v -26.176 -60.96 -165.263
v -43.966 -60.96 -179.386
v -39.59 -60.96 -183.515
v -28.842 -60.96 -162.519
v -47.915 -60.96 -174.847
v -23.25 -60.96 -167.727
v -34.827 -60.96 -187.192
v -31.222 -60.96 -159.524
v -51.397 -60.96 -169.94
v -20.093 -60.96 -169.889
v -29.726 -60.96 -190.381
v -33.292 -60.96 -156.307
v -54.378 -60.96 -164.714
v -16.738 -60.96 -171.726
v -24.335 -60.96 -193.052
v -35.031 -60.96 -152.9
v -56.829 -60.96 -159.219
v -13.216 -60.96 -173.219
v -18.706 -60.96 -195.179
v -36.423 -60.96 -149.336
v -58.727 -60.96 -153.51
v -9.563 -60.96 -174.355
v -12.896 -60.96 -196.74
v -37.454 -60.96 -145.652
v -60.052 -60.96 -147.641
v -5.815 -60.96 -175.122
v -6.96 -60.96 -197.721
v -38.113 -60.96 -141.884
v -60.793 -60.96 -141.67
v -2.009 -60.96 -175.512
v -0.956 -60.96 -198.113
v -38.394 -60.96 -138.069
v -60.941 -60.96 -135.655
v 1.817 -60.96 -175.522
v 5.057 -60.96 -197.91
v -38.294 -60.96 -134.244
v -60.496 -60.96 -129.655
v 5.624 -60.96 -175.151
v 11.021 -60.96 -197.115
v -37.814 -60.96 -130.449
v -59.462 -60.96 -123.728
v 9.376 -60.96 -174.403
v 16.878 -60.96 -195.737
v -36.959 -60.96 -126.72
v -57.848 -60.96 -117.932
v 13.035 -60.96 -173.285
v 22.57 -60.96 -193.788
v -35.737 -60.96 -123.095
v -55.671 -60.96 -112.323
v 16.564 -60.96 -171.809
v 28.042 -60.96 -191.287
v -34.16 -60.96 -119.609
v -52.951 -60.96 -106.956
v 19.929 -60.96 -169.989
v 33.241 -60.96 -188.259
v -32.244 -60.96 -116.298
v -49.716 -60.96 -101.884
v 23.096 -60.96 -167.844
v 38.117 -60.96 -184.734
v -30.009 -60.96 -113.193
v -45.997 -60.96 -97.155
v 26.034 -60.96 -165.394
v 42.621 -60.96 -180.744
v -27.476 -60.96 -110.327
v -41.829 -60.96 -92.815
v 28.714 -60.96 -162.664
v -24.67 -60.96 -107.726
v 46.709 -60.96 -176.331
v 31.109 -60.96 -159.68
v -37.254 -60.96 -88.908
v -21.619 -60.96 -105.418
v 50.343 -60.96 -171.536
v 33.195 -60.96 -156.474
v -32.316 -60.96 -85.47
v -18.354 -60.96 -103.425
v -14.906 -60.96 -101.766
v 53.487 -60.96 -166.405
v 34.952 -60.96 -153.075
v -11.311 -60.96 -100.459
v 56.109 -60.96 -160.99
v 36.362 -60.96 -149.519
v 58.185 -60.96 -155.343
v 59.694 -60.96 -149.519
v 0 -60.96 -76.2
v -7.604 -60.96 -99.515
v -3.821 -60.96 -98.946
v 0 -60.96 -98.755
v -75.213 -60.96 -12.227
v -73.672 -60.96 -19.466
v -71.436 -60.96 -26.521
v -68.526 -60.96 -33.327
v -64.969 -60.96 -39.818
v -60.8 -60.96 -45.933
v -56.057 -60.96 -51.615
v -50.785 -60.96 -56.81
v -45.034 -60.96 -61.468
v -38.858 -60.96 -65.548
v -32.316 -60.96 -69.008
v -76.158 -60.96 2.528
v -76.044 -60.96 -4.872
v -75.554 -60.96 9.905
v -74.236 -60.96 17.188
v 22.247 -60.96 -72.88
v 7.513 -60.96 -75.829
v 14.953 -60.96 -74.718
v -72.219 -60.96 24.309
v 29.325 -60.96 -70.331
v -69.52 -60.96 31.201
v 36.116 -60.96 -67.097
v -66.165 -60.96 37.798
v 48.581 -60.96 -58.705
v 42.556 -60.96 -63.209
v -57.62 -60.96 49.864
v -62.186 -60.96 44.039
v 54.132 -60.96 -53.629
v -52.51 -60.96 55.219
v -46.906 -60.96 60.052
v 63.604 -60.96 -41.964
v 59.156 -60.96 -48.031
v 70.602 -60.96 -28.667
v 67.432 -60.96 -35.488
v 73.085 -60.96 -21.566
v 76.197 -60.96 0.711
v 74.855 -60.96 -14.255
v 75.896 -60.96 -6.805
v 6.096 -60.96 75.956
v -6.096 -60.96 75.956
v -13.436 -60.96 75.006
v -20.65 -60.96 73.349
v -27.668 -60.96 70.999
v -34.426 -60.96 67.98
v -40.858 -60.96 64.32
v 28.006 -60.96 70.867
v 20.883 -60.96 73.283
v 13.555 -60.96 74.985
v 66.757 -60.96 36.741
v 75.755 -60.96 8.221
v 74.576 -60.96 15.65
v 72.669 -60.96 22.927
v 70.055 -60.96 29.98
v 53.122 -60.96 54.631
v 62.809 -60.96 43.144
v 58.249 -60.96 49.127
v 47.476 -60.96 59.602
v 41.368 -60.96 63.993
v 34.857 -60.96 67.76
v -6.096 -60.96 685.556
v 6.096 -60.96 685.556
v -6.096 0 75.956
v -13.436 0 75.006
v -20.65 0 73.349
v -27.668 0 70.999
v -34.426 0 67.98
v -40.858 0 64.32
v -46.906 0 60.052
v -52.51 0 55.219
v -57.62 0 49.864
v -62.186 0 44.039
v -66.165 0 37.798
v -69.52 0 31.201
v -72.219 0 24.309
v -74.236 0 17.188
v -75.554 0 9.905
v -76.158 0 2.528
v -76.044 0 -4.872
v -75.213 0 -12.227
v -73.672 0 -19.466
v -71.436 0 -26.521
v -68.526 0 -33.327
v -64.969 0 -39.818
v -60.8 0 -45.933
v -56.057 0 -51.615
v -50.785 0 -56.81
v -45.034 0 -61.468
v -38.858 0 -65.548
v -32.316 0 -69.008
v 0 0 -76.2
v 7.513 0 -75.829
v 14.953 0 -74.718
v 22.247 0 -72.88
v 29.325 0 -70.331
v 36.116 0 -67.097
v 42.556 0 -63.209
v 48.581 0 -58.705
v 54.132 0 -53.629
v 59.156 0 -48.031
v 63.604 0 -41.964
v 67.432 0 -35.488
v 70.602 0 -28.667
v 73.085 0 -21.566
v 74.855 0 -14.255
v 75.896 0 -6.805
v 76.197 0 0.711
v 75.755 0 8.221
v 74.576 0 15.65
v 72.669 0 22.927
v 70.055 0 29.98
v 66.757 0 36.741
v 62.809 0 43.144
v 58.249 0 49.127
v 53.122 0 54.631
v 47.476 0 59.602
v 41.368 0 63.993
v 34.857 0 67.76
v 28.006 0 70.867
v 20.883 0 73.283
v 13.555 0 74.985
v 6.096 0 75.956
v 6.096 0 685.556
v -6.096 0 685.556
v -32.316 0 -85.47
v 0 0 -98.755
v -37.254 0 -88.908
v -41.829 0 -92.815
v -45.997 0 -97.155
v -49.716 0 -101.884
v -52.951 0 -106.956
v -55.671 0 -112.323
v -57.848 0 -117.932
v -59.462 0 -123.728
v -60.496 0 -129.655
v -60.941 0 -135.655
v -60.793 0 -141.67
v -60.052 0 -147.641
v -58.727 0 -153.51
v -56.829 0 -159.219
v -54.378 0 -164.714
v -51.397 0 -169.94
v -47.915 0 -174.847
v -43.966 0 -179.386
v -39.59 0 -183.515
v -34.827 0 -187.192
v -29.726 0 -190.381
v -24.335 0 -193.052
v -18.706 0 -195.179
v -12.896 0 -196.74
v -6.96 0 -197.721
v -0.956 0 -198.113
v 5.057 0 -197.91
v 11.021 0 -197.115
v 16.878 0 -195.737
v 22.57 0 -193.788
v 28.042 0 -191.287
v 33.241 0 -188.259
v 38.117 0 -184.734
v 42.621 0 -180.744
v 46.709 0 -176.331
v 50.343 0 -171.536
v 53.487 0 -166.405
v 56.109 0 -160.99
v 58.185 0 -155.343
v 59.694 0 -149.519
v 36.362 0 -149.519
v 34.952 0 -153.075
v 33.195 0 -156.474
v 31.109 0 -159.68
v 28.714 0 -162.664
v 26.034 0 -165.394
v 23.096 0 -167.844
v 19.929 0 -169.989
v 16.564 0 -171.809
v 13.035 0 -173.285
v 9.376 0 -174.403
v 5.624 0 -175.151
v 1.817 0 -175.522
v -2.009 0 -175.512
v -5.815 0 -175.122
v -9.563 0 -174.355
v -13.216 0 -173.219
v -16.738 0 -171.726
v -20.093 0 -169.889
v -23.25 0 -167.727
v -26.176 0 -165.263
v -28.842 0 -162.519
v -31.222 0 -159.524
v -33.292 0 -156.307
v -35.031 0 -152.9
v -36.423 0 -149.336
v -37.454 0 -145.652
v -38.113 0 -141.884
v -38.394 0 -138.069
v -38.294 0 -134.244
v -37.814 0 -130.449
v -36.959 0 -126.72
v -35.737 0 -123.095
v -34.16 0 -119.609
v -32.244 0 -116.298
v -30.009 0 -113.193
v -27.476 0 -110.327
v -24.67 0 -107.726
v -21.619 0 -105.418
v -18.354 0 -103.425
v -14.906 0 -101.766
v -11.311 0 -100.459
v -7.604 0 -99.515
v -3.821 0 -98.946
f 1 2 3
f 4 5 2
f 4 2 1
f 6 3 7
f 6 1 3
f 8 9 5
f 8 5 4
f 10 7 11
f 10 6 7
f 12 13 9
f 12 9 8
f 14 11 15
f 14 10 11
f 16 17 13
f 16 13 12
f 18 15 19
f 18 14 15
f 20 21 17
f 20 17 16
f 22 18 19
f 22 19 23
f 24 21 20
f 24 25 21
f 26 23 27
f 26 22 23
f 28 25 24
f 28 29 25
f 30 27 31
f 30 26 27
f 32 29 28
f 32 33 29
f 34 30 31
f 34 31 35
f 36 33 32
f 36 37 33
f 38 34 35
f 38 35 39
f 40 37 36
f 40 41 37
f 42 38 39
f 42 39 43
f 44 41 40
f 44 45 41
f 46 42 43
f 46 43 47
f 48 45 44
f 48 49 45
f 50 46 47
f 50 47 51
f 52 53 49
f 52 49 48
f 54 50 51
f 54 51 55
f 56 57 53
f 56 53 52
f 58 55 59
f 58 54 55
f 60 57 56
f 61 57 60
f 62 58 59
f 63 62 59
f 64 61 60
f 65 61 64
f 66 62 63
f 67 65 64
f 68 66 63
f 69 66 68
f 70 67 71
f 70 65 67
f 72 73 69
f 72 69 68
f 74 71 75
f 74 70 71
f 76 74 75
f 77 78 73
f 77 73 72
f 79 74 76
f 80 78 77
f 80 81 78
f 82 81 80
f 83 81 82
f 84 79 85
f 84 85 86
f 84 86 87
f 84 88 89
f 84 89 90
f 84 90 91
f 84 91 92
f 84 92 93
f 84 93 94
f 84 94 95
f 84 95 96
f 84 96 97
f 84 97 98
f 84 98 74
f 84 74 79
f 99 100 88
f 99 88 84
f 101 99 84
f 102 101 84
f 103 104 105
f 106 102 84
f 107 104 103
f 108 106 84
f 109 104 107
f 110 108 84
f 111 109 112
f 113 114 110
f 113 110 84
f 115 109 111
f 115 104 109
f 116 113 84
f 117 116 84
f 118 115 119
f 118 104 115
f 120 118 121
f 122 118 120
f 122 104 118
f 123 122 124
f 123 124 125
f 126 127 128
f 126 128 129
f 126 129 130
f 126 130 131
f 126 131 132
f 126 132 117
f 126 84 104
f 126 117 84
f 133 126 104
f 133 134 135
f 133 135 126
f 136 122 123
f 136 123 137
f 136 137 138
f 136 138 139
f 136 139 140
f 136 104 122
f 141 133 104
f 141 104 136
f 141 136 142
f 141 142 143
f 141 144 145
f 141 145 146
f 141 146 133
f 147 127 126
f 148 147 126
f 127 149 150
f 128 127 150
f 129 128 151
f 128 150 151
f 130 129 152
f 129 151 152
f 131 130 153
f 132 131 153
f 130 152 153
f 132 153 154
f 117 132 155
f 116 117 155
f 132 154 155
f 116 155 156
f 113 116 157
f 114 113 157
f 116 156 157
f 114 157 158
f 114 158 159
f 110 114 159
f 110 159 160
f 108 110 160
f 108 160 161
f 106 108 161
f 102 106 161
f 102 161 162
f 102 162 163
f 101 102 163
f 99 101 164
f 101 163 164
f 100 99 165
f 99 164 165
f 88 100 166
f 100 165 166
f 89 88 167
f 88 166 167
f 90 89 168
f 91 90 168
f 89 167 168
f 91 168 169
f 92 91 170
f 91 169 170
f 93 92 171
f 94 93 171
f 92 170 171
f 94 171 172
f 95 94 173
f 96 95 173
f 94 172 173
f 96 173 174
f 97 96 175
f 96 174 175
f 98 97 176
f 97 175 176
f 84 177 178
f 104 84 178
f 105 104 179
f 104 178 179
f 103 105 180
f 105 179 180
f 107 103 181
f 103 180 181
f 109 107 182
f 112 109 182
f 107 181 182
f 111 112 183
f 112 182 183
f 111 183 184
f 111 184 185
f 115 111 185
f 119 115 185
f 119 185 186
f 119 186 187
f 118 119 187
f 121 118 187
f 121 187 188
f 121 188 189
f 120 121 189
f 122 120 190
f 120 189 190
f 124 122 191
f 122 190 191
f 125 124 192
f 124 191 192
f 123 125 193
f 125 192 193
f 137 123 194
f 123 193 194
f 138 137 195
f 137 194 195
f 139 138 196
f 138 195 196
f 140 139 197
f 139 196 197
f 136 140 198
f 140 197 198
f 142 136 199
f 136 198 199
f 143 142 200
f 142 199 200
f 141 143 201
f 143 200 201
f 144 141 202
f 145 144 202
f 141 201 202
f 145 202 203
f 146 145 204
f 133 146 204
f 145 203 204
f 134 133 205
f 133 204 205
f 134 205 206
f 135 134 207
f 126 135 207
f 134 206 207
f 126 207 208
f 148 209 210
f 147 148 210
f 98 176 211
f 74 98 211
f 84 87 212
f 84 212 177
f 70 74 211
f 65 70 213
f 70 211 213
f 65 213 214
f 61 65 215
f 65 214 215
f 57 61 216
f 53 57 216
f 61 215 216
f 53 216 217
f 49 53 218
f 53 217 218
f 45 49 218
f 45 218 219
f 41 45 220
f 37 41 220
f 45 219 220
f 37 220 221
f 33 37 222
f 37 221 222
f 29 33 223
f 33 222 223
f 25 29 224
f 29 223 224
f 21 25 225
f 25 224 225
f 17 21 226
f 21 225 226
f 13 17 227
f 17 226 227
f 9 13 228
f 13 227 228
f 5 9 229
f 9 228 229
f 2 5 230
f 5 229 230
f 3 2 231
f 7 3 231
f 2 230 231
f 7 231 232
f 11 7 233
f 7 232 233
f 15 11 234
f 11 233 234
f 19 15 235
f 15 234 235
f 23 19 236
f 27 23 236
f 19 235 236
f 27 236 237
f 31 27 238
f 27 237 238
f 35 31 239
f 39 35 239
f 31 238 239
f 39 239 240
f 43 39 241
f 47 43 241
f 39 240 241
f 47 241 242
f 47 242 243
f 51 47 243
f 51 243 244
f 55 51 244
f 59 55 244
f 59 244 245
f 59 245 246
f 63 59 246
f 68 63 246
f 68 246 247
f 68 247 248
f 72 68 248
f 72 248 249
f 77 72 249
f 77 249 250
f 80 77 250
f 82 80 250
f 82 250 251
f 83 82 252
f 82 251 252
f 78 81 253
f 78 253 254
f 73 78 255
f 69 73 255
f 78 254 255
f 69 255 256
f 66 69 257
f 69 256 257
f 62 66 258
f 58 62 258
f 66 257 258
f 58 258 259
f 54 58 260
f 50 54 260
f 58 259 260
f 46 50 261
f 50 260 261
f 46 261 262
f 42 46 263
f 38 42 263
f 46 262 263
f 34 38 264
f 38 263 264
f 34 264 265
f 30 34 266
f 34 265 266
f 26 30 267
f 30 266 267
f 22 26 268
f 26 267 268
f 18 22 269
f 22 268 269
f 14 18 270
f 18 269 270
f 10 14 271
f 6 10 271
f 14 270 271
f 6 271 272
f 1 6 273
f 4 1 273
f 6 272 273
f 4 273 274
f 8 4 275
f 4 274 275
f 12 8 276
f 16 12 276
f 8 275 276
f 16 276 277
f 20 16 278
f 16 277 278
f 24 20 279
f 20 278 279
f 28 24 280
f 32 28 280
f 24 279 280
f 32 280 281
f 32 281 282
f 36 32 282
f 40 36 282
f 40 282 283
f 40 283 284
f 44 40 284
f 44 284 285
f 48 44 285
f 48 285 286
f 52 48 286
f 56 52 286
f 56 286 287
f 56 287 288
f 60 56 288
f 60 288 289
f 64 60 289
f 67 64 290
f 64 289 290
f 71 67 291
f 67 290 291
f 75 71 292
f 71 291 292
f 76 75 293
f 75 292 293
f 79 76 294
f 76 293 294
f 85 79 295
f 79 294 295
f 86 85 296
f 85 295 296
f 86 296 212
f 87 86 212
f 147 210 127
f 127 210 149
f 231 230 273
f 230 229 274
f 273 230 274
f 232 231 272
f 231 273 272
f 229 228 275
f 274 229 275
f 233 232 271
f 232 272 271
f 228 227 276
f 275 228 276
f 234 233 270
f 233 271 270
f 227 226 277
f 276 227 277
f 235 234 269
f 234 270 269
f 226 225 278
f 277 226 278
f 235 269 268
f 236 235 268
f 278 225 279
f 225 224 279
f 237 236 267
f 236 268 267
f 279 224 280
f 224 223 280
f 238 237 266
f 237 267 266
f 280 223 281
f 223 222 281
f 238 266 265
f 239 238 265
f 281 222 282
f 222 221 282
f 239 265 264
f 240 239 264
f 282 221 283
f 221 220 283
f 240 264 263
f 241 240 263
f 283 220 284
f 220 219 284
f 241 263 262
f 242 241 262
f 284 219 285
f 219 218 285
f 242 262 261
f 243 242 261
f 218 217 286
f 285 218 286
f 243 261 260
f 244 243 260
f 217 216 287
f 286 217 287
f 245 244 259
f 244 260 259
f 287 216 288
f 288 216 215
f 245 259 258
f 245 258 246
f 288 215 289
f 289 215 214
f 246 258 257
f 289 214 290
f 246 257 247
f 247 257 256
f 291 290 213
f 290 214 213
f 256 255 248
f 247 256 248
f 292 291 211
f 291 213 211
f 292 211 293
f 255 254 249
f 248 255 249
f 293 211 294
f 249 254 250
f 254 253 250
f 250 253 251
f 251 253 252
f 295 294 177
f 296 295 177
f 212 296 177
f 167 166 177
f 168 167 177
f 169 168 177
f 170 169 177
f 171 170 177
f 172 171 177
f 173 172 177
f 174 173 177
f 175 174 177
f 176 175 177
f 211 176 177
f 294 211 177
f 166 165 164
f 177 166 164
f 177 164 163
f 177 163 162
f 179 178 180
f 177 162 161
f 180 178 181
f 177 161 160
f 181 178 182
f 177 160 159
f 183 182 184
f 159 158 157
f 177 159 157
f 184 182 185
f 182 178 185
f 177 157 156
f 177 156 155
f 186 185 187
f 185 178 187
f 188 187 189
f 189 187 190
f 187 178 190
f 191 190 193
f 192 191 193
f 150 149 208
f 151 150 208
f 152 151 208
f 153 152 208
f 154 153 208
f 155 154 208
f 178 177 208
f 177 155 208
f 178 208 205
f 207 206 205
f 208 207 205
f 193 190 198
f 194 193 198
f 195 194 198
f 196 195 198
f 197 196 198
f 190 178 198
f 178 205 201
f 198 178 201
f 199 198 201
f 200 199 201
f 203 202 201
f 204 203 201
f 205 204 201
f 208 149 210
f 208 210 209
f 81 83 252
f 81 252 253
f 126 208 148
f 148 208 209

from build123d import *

# Parameters (mm, degrees)
F1_DEPTH = 60.96


# Not quite as in the source:
# - a feature names something its author has since deleted; it is built from what else it names


with BuildPart() as f1:
    # F0 (on Front) → F1 (new body)
    with BuildSketch(Plane.XZ):
        with BuildLine():
            Line((-6.096, 685.5557686025), (-6.096, 75.9557686025))
            ThreePointArc((-6.096, 75.9557686025), (-74.9833545956, 13.5623203614), (-32.3157872997, -69.0081871317))
            Line((-32.3157872997, -69.0081871317), (-32.3157872997, -85.470431505))
            ThreePointArc((-32.3157872997, -85.470431505), (-34.8273647694, -187.19175255), (59.6940359728, -149.5189509783))
            Line((59.6940359728, -149.5189509783), (36.3618585551, -149.5189509783))
            ThreePointArc((36.3618585551, -149.5189509783), (-31.2215584924, -159.5238706884), (0, -98.7552030748))
            Line((0, -98.7552030748), (0, -76.2))
            ThreePointArc((0, -76.2), (76.1389176687, -3.0504452534), (6.096, 75.9557686025))
            Line((6.096, 75.9557686025), (6.096, 685.5557686025))
            Line((6.096, 685.5557686025), (-6.096, 685.5557686025))
        make_face()
    extrude(amount=F1_DEPTH)


solid = f1.part
